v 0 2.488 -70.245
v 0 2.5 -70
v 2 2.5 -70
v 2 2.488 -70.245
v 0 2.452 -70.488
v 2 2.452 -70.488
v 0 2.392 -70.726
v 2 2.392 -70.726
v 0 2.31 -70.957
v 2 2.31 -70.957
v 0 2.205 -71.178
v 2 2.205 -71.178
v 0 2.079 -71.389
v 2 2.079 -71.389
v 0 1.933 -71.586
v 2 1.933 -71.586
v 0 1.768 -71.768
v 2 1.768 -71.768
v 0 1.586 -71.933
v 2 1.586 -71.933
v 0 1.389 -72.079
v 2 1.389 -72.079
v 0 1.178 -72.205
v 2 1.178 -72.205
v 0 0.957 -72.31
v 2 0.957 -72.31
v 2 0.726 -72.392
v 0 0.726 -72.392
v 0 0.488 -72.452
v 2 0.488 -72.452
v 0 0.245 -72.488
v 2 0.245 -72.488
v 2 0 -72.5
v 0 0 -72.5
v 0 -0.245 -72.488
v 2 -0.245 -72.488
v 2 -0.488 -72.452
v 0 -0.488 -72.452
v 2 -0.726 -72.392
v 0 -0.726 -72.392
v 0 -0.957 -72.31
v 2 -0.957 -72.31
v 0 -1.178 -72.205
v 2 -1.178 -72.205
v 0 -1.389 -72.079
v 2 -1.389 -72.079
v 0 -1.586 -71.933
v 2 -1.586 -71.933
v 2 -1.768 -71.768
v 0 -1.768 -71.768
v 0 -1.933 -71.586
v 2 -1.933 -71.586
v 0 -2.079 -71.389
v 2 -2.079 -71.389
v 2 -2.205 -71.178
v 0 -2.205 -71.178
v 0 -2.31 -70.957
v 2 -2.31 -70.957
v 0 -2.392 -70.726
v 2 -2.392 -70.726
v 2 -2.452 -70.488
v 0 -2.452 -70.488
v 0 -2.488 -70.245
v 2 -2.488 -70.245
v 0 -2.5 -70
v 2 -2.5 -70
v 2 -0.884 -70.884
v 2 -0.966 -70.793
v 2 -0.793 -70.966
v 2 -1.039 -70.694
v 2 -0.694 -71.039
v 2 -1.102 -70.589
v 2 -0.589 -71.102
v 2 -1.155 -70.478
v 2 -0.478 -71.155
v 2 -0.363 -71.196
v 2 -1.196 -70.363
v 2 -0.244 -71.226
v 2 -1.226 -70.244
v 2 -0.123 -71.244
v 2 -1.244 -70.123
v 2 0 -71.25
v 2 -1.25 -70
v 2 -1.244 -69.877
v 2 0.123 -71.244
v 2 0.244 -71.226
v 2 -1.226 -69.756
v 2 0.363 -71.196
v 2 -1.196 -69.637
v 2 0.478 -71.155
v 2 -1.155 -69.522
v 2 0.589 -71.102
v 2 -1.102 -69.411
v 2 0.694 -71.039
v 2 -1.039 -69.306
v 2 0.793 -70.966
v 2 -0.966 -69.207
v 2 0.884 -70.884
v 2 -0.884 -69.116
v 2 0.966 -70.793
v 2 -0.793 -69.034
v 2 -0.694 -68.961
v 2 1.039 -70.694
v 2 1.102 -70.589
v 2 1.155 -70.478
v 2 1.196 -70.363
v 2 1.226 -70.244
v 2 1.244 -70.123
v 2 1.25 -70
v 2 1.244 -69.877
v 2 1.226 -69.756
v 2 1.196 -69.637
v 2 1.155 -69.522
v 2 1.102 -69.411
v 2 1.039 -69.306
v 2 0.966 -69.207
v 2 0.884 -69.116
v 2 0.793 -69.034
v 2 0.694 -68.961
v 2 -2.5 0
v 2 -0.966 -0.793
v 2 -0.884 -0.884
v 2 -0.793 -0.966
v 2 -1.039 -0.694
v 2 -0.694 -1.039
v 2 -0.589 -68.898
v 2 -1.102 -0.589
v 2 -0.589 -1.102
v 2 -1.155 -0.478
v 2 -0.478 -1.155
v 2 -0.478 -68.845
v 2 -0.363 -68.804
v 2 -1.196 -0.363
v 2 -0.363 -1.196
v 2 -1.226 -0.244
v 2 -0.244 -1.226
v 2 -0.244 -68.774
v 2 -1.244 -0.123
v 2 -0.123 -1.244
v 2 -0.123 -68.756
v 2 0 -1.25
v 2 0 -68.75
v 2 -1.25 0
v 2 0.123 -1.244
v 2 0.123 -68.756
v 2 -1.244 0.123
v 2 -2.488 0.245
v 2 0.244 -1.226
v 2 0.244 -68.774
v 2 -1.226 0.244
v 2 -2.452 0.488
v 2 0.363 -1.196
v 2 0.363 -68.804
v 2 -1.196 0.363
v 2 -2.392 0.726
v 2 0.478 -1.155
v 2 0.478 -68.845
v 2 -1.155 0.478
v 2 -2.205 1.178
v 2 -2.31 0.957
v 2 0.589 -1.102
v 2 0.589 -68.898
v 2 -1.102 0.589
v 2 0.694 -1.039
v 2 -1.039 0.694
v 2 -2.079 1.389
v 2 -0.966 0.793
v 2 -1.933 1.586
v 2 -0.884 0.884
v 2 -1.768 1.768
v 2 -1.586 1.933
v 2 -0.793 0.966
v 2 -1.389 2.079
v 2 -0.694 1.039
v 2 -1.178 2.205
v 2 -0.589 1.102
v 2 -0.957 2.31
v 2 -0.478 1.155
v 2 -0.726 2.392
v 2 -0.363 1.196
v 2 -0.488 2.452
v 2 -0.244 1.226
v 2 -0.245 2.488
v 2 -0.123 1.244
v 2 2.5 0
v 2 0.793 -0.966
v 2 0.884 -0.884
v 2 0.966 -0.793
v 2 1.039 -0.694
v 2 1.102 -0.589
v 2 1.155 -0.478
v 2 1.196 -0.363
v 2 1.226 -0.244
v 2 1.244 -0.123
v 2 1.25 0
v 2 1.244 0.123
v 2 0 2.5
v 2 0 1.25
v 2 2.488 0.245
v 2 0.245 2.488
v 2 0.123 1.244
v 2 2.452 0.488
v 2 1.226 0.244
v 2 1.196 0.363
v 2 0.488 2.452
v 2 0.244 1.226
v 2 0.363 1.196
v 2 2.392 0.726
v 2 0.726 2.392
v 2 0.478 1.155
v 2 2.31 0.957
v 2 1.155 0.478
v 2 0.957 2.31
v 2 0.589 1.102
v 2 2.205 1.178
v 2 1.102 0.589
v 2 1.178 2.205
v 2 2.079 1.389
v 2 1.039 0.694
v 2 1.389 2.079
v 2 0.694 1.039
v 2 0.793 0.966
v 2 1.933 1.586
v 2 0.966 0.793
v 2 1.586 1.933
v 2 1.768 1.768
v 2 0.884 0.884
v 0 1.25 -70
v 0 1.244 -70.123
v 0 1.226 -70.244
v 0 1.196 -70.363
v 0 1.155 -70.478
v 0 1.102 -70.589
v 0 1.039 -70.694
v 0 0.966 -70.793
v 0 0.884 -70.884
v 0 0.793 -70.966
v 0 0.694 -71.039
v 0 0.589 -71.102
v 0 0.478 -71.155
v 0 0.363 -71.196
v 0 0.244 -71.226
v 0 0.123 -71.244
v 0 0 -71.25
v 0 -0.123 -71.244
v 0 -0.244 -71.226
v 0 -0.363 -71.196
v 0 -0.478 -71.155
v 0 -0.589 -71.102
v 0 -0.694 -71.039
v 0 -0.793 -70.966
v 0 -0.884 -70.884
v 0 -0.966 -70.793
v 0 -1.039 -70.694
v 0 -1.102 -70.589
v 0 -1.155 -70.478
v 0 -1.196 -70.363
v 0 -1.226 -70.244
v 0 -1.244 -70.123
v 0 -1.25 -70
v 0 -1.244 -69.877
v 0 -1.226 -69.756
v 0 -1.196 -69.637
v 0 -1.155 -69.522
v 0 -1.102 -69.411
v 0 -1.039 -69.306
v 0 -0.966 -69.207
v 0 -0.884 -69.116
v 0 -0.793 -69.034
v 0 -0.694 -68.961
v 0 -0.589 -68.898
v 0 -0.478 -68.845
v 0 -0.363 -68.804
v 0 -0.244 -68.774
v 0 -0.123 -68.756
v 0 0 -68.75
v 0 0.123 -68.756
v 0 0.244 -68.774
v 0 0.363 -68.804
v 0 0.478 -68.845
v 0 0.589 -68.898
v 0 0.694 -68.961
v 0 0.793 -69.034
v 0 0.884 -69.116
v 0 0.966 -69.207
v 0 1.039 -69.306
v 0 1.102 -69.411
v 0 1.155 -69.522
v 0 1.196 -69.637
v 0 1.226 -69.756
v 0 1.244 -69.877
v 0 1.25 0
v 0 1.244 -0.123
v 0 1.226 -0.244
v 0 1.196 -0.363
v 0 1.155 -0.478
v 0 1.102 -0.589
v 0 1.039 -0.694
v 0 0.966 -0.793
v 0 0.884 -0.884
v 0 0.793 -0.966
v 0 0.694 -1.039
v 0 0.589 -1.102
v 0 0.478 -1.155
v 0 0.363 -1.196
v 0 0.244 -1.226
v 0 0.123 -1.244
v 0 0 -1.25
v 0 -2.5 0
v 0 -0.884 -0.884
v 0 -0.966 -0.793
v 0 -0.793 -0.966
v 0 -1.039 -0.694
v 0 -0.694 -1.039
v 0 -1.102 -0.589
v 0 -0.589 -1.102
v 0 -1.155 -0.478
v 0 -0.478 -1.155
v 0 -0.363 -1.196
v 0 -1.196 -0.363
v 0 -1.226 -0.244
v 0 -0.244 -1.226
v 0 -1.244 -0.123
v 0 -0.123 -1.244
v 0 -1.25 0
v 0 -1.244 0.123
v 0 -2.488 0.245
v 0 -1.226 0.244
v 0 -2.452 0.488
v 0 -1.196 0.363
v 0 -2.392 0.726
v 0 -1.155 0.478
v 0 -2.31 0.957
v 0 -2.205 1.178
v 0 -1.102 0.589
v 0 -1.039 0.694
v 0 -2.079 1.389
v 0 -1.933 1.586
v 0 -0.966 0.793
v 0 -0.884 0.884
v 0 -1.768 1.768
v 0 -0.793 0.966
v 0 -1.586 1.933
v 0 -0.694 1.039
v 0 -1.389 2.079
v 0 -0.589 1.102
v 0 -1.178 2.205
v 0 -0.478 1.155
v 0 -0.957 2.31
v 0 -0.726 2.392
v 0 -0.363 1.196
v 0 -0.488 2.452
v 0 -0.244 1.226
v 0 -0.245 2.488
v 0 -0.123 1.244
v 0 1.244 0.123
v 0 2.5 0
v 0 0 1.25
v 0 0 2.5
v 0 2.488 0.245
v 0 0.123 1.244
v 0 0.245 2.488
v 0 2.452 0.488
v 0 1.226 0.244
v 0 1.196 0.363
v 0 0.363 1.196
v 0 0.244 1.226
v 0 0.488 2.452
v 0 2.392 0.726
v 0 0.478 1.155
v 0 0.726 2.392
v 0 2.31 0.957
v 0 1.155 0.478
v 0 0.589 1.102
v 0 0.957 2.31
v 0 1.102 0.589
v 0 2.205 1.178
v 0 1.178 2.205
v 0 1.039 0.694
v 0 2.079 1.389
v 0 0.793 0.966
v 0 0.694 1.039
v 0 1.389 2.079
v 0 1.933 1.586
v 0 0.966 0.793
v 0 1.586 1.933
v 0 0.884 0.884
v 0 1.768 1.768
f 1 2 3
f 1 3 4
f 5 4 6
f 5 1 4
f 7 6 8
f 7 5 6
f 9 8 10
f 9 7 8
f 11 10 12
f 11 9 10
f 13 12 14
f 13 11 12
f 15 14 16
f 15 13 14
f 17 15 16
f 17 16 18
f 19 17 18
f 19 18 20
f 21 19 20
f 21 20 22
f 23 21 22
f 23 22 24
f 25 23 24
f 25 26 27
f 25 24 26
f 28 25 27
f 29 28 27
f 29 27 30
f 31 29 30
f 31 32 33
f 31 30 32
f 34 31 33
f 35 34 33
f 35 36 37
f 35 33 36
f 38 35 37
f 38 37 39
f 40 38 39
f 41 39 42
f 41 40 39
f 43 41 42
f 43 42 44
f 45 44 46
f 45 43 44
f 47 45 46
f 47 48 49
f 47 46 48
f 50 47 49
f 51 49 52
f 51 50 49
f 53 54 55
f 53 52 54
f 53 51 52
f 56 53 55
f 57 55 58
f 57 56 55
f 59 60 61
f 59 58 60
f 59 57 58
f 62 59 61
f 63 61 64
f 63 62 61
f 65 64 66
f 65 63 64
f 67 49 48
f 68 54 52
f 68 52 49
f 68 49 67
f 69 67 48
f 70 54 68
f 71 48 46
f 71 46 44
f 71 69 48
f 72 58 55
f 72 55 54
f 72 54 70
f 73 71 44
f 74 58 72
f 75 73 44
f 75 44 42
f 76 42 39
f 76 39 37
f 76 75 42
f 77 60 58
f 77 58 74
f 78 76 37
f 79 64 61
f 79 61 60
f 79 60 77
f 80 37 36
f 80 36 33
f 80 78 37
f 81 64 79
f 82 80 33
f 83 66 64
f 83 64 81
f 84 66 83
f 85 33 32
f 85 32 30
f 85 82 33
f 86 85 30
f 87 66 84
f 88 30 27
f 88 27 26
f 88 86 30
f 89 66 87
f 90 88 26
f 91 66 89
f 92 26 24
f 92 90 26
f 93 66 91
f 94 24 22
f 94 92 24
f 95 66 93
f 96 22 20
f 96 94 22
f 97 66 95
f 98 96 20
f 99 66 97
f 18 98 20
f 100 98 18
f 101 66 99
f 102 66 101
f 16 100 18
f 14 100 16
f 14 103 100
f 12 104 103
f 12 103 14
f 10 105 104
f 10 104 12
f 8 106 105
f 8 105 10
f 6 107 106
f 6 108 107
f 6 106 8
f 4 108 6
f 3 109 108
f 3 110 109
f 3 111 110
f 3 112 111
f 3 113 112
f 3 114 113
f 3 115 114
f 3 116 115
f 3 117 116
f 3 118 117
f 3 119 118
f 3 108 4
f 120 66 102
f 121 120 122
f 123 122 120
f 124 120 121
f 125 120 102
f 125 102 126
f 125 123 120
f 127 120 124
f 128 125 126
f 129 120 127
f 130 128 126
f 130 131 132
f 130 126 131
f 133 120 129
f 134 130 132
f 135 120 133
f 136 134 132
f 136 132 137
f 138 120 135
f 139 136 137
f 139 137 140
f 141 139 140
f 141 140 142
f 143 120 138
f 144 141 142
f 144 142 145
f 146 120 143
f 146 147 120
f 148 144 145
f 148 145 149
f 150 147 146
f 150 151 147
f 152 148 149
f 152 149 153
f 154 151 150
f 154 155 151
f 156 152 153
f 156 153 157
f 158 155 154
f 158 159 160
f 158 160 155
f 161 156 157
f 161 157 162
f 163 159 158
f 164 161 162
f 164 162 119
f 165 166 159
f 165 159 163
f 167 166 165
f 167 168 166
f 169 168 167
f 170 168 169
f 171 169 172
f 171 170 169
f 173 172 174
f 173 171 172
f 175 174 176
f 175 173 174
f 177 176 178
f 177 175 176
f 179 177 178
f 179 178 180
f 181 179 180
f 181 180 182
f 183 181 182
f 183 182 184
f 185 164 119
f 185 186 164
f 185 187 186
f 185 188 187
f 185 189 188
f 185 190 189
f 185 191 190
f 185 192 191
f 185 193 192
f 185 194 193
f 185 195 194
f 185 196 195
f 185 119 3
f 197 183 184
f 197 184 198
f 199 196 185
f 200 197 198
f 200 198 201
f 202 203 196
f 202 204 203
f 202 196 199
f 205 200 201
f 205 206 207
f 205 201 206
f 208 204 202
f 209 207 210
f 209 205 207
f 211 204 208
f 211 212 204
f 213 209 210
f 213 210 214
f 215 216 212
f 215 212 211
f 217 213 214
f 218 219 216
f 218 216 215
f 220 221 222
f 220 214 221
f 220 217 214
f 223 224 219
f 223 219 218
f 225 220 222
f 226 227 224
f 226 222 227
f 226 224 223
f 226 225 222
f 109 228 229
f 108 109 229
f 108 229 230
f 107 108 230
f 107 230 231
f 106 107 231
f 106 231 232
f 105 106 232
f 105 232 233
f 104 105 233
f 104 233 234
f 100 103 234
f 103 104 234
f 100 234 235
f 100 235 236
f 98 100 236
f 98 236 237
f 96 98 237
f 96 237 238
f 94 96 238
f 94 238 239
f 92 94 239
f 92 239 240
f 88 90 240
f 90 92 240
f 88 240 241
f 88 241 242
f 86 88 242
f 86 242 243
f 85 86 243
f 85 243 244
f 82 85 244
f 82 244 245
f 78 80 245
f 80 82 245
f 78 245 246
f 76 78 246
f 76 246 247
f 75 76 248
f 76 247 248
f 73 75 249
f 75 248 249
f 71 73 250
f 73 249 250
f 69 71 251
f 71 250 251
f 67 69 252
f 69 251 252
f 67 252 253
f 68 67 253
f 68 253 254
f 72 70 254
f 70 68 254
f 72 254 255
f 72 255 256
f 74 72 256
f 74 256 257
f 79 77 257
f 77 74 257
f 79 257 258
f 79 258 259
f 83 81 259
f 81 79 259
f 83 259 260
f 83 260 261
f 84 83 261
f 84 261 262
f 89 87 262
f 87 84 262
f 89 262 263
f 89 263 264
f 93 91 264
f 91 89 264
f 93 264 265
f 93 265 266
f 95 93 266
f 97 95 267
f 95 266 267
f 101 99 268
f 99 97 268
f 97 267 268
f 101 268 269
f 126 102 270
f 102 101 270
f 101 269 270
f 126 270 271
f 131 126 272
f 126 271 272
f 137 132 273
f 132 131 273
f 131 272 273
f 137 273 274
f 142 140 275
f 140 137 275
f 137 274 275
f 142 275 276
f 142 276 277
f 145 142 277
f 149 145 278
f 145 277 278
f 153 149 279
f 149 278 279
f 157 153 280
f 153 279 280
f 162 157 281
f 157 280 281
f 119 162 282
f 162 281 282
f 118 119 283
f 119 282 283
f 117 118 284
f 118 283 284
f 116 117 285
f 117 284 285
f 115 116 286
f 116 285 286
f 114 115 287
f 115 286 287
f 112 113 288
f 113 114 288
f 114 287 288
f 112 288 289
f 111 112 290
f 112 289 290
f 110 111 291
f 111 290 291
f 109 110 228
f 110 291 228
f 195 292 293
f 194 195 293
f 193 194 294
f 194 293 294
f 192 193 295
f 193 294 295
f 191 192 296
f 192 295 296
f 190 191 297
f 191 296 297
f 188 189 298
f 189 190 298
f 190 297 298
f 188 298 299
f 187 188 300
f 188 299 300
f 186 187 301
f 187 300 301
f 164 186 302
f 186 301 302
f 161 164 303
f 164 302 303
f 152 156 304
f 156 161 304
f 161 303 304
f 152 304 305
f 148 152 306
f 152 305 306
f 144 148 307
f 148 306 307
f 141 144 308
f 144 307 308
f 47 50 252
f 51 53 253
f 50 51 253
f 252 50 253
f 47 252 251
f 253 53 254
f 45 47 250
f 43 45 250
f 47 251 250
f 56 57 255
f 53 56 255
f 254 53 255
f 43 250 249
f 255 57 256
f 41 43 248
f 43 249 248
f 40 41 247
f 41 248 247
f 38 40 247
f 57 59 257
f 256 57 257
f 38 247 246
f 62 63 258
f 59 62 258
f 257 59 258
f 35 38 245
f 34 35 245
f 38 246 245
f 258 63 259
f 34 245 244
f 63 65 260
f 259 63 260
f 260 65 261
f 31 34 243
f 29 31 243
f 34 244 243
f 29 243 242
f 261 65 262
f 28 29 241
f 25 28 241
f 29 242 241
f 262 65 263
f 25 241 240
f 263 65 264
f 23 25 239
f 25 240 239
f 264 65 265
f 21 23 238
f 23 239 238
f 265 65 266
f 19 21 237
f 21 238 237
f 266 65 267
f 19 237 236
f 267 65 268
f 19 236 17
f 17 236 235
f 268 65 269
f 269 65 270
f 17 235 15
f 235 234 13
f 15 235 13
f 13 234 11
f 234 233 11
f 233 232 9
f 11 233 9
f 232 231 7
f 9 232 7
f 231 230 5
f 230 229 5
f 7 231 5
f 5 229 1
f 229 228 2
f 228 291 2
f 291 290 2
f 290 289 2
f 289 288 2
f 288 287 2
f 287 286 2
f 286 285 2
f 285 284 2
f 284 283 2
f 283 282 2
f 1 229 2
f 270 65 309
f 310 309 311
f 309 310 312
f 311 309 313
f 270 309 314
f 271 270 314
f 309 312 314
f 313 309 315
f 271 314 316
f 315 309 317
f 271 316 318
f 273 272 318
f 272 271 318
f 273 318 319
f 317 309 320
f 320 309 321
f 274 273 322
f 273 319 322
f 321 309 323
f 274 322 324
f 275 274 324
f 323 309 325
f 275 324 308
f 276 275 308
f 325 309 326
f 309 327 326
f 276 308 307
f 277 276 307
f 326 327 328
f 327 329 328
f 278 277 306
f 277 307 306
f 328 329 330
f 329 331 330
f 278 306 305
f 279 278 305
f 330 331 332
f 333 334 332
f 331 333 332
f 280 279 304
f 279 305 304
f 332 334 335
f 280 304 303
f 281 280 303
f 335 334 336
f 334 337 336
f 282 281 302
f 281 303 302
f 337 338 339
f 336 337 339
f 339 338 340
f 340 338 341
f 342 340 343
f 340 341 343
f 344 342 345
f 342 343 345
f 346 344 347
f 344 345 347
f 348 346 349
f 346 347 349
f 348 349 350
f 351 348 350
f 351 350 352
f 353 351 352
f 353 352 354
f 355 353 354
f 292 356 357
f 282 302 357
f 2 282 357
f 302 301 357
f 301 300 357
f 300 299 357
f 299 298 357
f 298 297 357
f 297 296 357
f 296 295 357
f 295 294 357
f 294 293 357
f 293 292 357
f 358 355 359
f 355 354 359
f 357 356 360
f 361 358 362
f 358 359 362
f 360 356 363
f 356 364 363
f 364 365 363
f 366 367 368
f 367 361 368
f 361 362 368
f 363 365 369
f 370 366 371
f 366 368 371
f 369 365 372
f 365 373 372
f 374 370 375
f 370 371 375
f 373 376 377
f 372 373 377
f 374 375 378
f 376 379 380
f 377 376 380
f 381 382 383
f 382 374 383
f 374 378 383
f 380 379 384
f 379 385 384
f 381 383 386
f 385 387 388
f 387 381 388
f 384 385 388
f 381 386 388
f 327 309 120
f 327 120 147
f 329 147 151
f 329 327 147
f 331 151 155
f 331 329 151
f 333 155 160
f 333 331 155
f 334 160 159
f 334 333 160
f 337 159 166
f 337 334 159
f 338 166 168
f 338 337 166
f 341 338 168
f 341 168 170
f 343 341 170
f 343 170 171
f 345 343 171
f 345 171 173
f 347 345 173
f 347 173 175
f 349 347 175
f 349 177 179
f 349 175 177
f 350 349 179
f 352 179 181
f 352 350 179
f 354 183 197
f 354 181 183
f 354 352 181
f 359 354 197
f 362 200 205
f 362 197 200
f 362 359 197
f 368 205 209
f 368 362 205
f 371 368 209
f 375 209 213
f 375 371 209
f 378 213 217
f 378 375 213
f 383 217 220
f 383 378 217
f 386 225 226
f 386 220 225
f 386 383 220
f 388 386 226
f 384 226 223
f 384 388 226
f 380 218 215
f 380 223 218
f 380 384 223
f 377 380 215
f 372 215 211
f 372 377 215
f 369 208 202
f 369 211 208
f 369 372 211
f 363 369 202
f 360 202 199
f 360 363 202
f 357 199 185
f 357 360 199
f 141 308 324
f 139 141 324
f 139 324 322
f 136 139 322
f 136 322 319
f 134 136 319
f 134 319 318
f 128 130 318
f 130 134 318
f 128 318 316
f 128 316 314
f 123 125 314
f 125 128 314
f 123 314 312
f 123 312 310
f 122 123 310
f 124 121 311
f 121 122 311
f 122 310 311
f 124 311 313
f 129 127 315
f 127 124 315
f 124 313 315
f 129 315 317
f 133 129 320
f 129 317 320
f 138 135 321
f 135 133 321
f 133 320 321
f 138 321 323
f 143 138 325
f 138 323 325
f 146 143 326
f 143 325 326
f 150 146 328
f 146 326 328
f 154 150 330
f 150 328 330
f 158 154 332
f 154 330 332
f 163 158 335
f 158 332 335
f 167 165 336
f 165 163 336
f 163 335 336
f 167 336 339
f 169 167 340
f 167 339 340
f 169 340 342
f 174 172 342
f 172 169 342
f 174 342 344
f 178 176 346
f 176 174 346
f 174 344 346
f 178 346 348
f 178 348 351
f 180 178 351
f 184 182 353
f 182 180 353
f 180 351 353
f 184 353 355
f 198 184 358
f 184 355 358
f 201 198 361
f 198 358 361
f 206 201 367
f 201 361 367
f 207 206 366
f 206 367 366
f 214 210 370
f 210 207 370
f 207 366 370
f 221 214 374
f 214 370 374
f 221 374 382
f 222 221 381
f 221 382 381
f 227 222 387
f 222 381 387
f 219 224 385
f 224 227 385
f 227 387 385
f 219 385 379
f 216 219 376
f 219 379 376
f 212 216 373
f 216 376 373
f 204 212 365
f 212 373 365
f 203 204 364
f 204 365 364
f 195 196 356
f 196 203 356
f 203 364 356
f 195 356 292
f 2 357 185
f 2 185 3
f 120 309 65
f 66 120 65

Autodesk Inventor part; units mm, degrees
ref_plane "YZ Plane" through (0, 0, 0) normal (1, 0, 0) x (0, 1, 0)
ref_plane "XZ Plane" through (0, 0, 0) normal (0, 1, 0) x (-1, 0, 0)
ref_plane "XY Plane" through (0, 0, 0) normal (0, 0, 1) x (1, 0, 0)
sketch "Sketch1" plane through (0, 0, 0) normal (1, 0, 0) x (0, 1, 0)
  line L0 (0, 0) -> (0, -70)
  arc A0 (2.5, 0) -> (-2.5, 0) centre (0, 0) ccw
  arc A1 (-2.5, -70) -> (2.5, -70) centre (0, -70) ccw
  line L1 (2.5, 0) -> (2.5, -70)
  line L2 (-2.5, 0) -> (-2.5, -70)
  circle A2 centre (0, 0) radius 1.25
  circle A3 centre (0, -70) radius 1.25
  dimension "d0" = 70
  dimension "d1" = 5
  dimension "d2" = 5
  dimension "d3" = 2.5
  dimension "d4" = 2.5
extrude "Extrusion1" add sketch "Sketch1" along normal blind 2
properties part number "base3"
